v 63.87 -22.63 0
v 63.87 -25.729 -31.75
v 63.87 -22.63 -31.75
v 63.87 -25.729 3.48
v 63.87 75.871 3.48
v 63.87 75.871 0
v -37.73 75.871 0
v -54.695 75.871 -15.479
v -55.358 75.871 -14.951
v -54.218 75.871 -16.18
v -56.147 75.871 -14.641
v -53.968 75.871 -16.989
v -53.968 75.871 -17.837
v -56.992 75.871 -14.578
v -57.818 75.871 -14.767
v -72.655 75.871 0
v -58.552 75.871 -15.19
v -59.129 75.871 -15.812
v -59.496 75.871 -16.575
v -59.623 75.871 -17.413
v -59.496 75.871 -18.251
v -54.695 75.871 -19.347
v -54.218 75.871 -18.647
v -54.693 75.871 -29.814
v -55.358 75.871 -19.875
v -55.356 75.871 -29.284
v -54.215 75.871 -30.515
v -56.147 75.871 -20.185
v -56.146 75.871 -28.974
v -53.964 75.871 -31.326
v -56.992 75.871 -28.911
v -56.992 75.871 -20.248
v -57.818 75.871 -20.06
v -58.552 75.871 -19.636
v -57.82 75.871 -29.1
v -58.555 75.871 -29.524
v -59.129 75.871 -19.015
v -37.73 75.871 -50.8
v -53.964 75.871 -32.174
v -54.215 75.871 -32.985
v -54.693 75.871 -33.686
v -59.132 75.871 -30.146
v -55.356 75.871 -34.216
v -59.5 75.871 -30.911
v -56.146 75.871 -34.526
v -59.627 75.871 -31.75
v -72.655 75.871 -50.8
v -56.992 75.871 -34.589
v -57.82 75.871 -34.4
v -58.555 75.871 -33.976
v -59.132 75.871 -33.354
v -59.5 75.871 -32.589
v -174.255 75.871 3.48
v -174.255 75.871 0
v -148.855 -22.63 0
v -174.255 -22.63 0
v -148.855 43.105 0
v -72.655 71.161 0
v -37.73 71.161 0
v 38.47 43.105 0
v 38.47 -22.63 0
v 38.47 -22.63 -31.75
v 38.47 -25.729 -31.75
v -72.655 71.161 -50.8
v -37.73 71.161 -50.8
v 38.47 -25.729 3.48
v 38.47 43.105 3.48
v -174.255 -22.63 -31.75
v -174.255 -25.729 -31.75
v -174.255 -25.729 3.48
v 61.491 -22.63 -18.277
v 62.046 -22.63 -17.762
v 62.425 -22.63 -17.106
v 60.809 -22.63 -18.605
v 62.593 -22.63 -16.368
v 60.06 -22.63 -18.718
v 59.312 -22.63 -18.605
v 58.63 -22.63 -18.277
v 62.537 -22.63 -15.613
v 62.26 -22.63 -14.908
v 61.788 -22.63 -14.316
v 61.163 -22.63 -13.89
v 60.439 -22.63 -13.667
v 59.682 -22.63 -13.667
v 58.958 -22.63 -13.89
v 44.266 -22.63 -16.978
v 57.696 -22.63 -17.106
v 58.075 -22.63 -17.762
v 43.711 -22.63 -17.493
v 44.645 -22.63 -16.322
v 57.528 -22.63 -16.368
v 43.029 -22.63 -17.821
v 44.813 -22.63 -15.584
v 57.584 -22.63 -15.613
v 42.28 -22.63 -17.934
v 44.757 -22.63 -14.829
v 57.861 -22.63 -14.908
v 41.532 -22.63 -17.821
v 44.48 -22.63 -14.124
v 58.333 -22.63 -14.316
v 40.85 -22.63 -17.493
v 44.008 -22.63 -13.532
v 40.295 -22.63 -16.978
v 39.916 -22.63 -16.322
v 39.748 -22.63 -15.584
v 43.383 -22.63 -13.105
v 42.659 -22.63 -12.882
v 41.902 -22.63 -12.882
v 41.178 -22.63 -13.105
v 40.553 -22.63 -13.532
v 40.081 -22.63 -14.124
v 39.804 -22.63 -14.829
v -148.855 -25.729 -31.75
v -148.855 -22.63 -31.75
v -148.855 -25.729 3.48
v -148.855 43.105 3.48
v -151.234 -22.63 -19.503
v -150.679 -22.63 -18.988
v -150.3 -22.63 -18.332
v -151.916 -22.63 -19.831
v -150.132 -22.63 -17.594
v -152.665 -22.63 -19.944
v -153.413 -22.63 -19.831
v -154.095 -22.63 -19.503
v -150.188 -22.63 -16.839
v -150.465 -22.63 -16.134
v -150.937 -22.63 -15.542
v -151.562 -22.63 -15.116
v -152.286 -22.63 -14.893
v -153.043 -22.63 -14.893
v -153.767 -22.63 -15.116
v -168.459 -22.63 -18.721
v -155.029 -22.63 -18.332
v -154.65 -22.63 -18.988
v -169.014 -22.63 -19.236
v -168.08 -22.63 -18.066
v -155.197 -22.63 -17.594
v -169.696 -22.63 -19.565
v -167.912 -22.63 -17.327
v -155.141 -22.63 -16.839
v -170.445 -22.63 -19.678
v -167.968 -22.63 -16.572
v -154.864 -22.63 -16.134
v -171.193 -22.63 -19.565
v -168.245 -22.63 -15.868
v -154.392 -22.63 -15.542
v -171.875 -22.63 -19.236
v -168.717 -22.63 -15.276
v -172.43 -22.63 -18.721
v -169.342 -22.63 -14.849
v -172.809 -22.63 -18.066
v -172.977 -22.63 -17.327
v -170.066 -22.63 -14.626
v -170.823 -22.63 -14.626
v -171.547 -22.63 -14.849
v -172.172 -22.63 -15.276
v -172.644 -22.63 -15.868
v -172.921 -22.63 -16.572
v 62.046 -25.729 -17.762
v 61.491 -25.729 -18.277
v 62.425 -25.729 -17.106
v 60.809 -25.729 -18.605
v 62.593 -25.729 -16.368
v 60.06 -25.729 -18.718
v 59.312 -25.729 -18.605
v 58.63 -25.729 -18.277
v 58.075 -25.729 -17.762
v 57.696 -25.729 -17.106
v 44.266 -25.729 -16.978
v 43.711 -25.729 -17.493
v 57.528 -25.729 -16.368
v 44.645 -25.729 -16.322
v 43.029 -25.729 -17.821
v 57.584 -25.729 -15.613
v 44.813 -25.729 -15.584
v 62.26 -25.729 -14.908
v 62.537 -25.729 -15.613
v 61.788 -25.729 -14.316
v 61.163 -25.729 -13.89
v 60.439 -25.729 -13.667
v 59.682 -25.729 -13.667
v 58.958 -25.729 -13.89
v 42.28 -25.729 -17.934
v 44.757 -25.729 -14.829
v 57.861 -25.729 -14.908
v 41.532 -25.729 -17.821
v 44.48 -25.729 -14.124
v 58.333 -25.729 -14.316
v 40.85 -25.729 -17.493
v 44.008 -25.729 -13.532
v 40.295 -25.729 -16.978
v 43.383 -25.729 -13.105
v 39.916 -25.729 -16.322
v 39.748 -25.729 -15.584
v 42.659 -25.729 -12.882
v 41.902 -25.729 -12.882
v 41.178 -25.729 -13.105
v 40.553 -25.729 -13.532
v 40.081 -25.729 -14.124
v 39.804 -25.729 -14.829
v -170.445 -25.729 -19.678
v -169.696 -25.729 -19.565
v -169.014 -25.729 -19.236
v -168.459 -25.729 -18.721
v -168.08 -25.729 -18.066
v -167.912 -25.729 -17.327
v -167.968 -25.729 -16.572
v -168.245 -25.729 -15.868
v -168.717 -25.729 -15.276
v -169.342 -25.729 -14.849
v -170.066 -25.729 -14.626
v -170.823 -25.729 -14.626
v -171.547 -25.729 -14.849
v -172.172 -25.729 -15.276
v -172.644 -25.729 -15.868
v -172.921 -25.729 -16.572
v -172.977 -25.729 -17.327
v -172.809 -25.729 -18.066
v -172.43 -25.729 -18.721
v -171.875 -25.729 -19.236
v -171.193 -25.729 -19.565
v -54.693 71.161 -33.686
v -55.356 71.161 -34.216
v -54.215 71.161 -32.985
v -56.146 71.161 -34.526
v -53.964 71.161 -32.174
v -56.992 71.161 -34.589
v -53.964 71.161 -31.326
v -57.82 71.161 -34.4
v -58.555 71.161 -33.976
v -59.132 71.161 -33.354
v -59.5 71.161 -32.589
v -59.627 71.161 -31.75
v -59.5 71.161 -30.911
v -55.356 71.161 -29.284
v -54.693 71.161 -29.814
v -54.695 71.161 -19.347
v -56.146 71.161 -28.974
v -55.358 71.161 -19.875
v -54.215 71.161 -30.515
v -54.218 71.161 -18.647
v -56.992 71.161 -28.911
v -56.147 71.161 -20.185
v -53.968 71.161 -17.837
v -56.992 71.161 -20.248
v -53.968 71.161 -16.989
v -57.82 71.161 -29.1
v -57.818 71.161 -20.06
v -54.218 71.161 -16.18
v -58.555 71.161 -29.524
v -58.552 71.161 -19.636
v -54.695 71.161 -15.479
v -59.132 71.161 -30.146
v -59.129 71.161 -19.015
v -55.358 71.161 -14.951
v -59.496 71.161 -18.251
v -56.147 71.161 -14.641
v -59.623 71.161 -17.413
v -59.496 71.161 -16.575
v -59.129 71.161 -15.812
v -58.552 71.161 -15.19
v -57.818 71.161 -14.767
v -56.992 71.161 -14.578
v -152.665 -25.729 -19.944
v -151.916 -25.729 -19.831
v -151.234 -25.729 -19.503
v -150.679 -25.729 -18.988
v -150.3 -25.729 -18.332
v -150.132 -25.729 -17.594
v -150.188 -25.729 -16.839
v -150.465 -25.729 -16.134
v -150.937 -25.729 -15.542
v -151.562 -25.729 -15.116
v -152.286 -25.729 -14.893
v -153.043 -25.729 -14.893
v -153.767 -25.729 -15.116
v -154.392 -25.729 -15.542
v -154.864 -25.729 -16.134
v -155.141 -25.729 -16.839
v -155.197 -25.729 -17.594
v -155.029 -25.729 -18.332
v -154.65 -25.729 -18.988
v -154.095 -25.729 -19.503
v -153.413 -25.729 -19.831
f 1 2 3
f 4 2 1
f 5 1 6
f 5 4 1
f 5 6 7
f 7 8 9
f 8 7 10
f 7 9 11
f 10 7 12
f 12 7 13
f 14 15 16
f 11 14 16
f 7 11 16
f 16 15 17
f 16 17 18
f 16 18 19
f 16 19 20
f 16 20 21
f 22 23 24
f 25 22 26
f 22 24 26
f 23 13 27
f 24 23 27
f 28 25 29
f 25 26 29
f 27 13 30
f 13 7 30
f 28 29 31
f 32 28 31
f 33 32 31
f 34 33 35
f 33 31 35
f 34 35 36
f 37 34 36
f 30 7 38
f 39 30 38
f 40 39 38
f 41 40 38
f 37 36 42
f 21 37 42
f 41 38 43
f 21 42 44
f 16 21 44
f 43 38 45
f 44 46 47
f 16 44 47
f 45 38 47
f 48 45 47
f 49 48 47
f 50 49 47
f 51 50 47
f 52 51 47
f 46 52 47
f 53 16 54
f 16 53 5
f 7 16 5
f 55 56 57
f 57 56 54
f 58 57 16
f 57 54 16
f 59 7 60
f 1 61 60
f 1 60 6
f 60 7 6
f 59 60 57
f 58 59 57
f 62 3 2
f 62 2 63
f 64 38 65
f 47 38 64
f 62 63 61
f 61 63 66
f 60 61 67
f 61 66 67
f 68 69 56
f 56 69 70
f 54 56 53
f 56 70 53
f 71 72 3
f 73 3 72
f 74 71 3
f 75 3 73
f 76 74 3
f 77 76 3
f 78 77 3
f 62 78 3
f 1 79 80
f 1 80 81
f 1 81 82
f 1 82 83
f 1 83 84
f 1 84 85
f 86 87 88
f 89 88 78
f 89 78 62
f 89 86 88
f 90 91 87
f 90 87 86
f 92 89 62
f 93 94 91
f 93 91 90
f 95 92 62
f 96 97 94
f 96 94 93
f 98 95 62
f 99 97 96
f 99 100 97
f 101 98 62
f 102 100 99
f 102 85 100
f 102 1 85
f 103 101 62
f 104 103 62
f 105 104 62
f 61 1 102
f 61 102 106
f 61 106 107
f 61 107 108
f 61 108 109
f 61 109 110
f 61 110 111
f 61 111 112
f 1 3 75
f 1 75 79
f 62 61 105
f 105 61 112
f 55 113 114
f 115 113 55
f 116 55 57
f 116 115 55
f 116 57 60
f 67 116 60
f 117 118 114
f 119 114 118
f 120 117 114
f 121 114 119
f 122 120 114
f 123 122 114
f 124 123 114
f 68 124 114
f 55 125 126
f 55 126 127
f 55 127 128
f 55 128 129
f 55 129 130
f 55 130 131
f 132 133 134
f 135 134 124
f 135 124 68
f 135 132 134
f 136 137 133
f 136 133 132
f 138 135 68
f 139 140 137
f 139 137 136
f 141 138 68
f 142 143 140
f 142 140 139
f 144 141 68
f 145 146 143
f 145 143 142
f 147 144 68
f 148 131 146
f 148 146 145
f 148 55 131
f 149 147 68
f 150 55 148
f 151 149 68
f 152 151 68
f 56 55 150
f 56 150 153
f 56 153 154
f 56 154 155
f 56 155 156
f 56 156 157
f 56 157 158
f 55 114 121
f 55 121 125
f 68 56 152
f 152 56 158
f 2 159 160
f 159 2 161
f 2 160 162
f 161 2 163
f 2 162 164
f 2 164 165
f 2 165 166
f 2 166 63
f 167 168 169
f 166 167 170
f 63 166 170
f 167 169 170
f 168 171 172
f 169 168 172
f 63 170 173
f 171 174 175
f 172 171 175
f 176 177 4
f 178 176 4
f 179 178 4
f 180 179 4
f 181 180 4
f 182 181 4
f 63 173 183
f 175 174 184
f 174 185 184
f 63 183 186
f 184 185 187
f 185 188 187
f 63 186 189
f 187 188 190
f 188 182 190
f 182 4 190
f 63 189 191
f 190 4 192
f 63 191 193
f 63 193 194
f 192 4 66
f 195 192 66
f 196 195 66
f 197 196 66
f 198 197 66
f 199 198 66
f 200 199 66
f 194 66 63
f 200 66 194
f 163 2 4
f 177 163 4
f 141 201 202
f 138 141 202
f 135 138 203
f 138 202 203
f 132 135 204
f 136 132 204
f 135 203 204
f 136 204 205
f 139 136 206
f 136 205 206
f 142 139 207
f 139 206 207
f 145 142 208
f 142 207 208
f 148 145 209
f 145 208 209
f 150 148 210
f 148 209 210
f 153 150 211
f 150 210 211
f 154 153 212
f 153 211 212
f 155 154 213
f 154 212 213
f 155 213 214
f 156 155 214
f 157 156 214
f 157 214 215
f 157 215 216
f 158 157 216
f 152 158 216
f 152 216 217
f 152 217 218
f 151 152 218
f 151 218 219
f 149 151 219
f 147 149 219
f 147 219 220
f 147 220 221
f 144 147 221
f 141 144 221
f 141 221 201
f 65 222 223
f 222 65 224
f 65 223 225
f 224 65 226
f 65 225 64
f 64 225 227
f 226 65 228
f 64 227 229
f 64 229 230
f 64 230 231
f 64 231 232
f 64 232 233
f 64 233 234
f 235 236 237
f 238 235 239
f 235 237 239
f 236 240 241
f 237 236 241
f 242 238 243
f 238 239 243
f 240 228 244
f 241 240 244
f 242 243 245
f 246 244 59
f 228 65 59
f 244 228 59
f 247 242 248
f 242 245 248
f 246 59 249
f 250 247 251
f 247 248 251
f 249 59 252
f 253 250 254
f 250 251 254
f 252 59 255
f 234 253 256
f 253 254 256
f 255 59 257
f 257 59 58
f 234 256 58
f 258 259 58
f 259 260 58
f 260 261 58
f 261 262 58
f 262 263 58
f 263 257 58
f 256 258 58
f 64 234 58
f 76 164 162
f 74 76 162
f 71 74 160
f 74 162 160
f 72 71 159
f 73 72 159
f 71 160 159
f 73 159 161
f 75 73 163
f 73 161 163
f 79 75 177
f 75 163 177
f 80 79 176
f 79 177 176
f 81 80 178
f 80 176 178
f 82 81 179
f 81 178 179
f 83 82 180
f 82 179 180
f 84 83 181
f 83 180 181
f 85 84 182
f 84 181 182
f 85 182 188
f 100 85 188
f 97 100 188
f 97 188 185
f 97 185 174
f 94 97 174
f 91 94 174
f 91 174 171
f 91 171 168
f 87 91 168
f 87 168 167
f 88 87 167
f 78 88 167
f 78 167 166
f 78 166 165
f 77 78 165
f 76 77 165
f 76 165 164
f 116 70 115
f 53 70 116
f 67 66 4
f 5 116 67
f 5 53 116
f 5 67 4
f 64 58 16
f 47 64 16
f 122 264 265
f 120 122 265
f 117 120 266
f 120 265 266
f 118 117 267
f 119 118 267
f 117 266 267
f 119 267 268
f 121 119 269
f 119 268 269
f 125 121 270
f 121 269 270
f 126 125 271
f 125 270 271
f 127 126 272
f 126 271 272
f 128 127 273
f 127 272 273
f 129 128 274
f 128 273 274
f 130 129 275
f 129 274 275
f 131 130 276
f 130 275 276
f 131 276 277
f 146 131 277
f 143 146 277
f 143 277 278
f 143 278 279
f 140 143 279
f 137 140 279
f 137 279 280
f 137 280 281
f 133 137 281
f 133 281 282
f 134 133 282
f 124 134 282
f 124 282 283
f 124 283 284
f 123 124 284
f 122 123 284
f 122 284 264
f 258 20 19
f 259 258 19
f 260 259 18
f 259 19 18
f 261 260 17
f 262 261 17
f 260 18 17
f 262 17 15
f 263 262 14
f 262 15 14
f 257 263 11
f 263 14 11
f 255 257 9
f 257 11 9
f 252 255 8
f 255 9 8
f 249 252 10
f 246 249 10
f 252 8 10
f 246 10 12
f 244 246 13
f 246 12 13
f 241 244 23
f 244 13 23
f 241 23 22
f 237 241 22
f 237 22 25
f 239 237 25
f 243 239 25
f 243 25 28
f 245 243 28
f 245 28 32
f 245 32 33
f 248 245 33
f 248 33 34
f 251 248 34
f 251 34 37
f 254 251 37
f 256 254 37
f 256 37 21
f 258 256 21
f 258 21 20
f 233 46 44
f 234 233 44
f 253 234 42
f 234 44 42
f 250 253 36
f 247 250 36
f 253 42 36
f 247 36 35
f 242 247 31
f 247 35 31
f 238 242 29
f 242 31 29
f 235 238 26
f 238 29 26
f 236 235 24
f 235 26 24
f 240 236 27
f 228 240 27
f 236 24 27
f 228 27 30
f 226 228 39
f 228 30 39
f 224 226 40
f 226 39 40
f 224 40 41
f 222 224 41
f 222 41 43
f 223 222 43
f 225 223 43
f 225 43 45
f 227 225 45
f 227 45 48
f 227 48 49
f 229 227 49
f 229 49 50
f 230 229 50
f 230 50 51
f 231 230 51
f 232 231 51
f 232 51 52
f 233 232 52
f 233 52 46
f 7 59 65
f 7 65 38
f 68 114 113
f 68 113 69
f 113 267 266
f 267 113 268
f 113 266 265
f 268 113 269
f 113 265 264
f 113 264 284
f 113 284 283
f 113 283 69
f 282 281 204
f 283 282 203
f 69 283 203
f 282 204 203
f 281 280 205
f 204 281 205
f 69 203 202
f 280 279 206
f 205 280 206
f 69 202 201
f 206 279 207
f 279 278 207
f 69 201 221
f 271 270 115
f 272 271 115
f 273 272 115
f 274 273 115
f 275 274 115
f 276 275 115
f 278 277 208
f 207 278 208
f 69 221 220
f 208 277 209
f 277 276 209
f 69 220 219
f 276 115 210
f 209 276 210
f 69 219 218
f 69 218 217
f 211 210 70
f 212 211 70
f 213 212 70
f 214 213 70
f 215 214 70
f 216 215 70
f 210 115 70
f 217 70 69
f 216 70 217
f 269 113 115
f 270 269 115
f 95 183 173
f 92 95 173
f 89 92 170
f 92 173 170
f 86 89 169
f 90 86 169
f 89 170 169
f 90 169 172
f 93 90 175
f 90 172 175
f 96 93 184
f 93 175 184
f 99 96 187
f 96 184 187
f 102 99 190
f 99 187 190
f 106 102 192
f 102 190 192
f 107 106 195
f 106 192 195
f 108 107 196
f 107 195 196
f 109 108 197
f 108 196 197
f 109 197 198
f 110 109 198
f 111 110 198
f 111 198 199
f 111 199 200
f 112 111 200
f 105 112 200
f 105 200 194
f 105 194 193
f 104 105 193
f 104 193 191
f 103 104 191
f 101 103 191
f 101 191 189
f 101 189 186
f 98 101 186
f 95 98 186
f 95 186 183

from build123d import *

# Parameters (mm, degrees)
BOSS_EXTRUDE1_DEPTH = 3.4798
SKETCH2_W           = 25.4
SKETCH2_H           = 3.0988
BOSS_EXTRUDE2_DEPTH = 31.75
SKETCH3_W           = 25.4
SKETCH3_H           = 3.0988
BOSS_EXTRUDE3_DEPTH = 31.75
SKETCH4_W           = 34.925
SKETCH4_H           = 4.709822999
BOSS_EXTRUDE4_DEPTH = 50.8
SKETCH5_R           = 2.54
CUT_EXTRUDE1_DEPTH  = 209.009244951
SKETCH6_R           = 2.54
CUT_EXTRUDE2_DEPTH  = 209.009244951
SKETCH7_R           = 2.54
CUT_EXTRUDE3_DEPTH  = 209.009244951
SKETCH8_R           = 2.54
CUT_EXTRUDE4_DEPTH  = 50.8
SKETCH9_R           = 2.843025999
CUT_EXTRUDE5_DEPTH  = 209.009244951
SKETCH10_R          = 2.846976016
CUT_EXTRUDE6_DEPTH  = 50.8


with BuildPart() as part:
    # Sketch1 → Boss-Extrude1 (new body)
    with BuildSketch(Plane.XY):
        Polygon((-174.254543657, -25.729136112), (-148.854543657, -25.729136112), (-148.854543657, 43.104656603), (38.470456343, 43.104656603), (38.470456343, -25.729136112), (63.870456343, -25.729136112), (63.870456343, 75.870863888), (-174.254543657, 75.870863888), align=None)
    extrude(amount=BOSS_EXTRUDE1_DEPTH)

    # Sketch2 → Boss-Extrude2 (add)
    with BuildSketch(Plane(origin=(0, 0, 0), x_dir=(-1, 0, 0), z_dir=(0, 0, -1))):
        with Locations((-51.170456343, -24.179736112)):
            Rectangle(SKETCH2_W, SKETCH2_H)
    extrude(amount=BOSS_EXTRUDE2_DEPTH)

    # Sketch3 → Boss-Extrude3 (add)
    with BuildSketch(Plane(origin=(0, 0, 0), x_dir=(-1, 0, 0), z_dir=(0, 0, -1))):
        with Locations((161.554543657, -24.179736112)):
            Rectangle(SKETCH3_W, SKETCH3_H)
    extrude(amount=BOSS_EXTRUDE3_DEPTH)

    # Sketch4 → Boss-Extrude4 (add)
    with BuildSketch(Plane(origin=(0, 0, 0), x_dir=(-1, 0, 0), z_dir=(0, 0, -1))):
        with Locations((55.192043657, 73.515952389)):
            Rectangle(SKETCH4_W, SKETCH4_H)
    extrude(amount=BOSS_EXTRUDE4_DEPTH)

    # Sketch5 → Cut-Extrude1 (cut, through all)
    with BuildSketch(Plane.XZ.offset(25.729136112)):
        with Locations(Location((42.280456343, -15.3939186, 0), (0, 0, 270))):
            Circle(SKETCH5_R)
    extrude(amount=-CUT_EXTRUDE1_DEPTH, mode=Mode.SUBTRACT)

    # Sketch6 → Cut-Extrude2 (cut, through all)
    with BuildSketch(Plane.XZ.offset(25.729136112)):
        with Locations(Location((-170.444543657, -17.137609378, 0), (0, 0, 270))):
            Circle(SKETCH6_R)
    extrude(amount=-CUT_EXTRUDE2_DEPTH, mode=Mode.SUBTRACT)

    # Sketch7 → Cut-Extrude3 (cut, through all)
    with BuildSketch(Plane.XZ.offset(25.729136112)):
        with Locations(Location((-152.664543657, -17.404243817, 0), (0, 0, 270))):
            Circle(SKETCH7_R)
    extrude(amount=-CUT_EXTRUDE3_DEPTH, mode=Mode.SUBTRACT)

    # Sketch8 → Cut-Extrude4 (cut)
    with BuildSketch(Plane(origin=(0, -25.729136112, 0), x_dir=(-1, 0, 0), z_dir=(0, -1, 0))):
        with Locations(Location((-60.060456343, 16.178164824, 0), (0, 0, 90))):
            Circle(SKETCH8_R)
    extrude(amount=-CUT_EXTRUDE4_DEPTH, mode=Mode.SUBTRACT)

    # Sketch9 → Cut-Extrude5 (cut, through all)
    with BuildSketch(Plane(origin=(0, 75.870863888, 0), x_dir=(1, 0, 0), z_dir=(0, 1, 0))):
        with Locations(Location((-56.779543657, 17.413178819, 0), (0, 0, 180))):
            Circle(SKETCH9_R)
    extrude(amount=-CUT_EXTRUDE5_DEPTH, mode=Mode.SUBTRACT)

    # Sketch10 → Cut-Extrude6 (cut)
    with BuildSketch(Plane(origin=(0, 75.870863888, 0), x_dir=(1, 0, 0), z_dir=(0, 1, 0))):
        with Locations(Location((-56.779543657, 31.75, 0), (0, 0, 180))):
            Circle(SKETCH10_R)
    extrude(amount=-CUT_EXTRUDE6_DEPTH, mode=Mode.SUBTRACT)


solid = part.part
